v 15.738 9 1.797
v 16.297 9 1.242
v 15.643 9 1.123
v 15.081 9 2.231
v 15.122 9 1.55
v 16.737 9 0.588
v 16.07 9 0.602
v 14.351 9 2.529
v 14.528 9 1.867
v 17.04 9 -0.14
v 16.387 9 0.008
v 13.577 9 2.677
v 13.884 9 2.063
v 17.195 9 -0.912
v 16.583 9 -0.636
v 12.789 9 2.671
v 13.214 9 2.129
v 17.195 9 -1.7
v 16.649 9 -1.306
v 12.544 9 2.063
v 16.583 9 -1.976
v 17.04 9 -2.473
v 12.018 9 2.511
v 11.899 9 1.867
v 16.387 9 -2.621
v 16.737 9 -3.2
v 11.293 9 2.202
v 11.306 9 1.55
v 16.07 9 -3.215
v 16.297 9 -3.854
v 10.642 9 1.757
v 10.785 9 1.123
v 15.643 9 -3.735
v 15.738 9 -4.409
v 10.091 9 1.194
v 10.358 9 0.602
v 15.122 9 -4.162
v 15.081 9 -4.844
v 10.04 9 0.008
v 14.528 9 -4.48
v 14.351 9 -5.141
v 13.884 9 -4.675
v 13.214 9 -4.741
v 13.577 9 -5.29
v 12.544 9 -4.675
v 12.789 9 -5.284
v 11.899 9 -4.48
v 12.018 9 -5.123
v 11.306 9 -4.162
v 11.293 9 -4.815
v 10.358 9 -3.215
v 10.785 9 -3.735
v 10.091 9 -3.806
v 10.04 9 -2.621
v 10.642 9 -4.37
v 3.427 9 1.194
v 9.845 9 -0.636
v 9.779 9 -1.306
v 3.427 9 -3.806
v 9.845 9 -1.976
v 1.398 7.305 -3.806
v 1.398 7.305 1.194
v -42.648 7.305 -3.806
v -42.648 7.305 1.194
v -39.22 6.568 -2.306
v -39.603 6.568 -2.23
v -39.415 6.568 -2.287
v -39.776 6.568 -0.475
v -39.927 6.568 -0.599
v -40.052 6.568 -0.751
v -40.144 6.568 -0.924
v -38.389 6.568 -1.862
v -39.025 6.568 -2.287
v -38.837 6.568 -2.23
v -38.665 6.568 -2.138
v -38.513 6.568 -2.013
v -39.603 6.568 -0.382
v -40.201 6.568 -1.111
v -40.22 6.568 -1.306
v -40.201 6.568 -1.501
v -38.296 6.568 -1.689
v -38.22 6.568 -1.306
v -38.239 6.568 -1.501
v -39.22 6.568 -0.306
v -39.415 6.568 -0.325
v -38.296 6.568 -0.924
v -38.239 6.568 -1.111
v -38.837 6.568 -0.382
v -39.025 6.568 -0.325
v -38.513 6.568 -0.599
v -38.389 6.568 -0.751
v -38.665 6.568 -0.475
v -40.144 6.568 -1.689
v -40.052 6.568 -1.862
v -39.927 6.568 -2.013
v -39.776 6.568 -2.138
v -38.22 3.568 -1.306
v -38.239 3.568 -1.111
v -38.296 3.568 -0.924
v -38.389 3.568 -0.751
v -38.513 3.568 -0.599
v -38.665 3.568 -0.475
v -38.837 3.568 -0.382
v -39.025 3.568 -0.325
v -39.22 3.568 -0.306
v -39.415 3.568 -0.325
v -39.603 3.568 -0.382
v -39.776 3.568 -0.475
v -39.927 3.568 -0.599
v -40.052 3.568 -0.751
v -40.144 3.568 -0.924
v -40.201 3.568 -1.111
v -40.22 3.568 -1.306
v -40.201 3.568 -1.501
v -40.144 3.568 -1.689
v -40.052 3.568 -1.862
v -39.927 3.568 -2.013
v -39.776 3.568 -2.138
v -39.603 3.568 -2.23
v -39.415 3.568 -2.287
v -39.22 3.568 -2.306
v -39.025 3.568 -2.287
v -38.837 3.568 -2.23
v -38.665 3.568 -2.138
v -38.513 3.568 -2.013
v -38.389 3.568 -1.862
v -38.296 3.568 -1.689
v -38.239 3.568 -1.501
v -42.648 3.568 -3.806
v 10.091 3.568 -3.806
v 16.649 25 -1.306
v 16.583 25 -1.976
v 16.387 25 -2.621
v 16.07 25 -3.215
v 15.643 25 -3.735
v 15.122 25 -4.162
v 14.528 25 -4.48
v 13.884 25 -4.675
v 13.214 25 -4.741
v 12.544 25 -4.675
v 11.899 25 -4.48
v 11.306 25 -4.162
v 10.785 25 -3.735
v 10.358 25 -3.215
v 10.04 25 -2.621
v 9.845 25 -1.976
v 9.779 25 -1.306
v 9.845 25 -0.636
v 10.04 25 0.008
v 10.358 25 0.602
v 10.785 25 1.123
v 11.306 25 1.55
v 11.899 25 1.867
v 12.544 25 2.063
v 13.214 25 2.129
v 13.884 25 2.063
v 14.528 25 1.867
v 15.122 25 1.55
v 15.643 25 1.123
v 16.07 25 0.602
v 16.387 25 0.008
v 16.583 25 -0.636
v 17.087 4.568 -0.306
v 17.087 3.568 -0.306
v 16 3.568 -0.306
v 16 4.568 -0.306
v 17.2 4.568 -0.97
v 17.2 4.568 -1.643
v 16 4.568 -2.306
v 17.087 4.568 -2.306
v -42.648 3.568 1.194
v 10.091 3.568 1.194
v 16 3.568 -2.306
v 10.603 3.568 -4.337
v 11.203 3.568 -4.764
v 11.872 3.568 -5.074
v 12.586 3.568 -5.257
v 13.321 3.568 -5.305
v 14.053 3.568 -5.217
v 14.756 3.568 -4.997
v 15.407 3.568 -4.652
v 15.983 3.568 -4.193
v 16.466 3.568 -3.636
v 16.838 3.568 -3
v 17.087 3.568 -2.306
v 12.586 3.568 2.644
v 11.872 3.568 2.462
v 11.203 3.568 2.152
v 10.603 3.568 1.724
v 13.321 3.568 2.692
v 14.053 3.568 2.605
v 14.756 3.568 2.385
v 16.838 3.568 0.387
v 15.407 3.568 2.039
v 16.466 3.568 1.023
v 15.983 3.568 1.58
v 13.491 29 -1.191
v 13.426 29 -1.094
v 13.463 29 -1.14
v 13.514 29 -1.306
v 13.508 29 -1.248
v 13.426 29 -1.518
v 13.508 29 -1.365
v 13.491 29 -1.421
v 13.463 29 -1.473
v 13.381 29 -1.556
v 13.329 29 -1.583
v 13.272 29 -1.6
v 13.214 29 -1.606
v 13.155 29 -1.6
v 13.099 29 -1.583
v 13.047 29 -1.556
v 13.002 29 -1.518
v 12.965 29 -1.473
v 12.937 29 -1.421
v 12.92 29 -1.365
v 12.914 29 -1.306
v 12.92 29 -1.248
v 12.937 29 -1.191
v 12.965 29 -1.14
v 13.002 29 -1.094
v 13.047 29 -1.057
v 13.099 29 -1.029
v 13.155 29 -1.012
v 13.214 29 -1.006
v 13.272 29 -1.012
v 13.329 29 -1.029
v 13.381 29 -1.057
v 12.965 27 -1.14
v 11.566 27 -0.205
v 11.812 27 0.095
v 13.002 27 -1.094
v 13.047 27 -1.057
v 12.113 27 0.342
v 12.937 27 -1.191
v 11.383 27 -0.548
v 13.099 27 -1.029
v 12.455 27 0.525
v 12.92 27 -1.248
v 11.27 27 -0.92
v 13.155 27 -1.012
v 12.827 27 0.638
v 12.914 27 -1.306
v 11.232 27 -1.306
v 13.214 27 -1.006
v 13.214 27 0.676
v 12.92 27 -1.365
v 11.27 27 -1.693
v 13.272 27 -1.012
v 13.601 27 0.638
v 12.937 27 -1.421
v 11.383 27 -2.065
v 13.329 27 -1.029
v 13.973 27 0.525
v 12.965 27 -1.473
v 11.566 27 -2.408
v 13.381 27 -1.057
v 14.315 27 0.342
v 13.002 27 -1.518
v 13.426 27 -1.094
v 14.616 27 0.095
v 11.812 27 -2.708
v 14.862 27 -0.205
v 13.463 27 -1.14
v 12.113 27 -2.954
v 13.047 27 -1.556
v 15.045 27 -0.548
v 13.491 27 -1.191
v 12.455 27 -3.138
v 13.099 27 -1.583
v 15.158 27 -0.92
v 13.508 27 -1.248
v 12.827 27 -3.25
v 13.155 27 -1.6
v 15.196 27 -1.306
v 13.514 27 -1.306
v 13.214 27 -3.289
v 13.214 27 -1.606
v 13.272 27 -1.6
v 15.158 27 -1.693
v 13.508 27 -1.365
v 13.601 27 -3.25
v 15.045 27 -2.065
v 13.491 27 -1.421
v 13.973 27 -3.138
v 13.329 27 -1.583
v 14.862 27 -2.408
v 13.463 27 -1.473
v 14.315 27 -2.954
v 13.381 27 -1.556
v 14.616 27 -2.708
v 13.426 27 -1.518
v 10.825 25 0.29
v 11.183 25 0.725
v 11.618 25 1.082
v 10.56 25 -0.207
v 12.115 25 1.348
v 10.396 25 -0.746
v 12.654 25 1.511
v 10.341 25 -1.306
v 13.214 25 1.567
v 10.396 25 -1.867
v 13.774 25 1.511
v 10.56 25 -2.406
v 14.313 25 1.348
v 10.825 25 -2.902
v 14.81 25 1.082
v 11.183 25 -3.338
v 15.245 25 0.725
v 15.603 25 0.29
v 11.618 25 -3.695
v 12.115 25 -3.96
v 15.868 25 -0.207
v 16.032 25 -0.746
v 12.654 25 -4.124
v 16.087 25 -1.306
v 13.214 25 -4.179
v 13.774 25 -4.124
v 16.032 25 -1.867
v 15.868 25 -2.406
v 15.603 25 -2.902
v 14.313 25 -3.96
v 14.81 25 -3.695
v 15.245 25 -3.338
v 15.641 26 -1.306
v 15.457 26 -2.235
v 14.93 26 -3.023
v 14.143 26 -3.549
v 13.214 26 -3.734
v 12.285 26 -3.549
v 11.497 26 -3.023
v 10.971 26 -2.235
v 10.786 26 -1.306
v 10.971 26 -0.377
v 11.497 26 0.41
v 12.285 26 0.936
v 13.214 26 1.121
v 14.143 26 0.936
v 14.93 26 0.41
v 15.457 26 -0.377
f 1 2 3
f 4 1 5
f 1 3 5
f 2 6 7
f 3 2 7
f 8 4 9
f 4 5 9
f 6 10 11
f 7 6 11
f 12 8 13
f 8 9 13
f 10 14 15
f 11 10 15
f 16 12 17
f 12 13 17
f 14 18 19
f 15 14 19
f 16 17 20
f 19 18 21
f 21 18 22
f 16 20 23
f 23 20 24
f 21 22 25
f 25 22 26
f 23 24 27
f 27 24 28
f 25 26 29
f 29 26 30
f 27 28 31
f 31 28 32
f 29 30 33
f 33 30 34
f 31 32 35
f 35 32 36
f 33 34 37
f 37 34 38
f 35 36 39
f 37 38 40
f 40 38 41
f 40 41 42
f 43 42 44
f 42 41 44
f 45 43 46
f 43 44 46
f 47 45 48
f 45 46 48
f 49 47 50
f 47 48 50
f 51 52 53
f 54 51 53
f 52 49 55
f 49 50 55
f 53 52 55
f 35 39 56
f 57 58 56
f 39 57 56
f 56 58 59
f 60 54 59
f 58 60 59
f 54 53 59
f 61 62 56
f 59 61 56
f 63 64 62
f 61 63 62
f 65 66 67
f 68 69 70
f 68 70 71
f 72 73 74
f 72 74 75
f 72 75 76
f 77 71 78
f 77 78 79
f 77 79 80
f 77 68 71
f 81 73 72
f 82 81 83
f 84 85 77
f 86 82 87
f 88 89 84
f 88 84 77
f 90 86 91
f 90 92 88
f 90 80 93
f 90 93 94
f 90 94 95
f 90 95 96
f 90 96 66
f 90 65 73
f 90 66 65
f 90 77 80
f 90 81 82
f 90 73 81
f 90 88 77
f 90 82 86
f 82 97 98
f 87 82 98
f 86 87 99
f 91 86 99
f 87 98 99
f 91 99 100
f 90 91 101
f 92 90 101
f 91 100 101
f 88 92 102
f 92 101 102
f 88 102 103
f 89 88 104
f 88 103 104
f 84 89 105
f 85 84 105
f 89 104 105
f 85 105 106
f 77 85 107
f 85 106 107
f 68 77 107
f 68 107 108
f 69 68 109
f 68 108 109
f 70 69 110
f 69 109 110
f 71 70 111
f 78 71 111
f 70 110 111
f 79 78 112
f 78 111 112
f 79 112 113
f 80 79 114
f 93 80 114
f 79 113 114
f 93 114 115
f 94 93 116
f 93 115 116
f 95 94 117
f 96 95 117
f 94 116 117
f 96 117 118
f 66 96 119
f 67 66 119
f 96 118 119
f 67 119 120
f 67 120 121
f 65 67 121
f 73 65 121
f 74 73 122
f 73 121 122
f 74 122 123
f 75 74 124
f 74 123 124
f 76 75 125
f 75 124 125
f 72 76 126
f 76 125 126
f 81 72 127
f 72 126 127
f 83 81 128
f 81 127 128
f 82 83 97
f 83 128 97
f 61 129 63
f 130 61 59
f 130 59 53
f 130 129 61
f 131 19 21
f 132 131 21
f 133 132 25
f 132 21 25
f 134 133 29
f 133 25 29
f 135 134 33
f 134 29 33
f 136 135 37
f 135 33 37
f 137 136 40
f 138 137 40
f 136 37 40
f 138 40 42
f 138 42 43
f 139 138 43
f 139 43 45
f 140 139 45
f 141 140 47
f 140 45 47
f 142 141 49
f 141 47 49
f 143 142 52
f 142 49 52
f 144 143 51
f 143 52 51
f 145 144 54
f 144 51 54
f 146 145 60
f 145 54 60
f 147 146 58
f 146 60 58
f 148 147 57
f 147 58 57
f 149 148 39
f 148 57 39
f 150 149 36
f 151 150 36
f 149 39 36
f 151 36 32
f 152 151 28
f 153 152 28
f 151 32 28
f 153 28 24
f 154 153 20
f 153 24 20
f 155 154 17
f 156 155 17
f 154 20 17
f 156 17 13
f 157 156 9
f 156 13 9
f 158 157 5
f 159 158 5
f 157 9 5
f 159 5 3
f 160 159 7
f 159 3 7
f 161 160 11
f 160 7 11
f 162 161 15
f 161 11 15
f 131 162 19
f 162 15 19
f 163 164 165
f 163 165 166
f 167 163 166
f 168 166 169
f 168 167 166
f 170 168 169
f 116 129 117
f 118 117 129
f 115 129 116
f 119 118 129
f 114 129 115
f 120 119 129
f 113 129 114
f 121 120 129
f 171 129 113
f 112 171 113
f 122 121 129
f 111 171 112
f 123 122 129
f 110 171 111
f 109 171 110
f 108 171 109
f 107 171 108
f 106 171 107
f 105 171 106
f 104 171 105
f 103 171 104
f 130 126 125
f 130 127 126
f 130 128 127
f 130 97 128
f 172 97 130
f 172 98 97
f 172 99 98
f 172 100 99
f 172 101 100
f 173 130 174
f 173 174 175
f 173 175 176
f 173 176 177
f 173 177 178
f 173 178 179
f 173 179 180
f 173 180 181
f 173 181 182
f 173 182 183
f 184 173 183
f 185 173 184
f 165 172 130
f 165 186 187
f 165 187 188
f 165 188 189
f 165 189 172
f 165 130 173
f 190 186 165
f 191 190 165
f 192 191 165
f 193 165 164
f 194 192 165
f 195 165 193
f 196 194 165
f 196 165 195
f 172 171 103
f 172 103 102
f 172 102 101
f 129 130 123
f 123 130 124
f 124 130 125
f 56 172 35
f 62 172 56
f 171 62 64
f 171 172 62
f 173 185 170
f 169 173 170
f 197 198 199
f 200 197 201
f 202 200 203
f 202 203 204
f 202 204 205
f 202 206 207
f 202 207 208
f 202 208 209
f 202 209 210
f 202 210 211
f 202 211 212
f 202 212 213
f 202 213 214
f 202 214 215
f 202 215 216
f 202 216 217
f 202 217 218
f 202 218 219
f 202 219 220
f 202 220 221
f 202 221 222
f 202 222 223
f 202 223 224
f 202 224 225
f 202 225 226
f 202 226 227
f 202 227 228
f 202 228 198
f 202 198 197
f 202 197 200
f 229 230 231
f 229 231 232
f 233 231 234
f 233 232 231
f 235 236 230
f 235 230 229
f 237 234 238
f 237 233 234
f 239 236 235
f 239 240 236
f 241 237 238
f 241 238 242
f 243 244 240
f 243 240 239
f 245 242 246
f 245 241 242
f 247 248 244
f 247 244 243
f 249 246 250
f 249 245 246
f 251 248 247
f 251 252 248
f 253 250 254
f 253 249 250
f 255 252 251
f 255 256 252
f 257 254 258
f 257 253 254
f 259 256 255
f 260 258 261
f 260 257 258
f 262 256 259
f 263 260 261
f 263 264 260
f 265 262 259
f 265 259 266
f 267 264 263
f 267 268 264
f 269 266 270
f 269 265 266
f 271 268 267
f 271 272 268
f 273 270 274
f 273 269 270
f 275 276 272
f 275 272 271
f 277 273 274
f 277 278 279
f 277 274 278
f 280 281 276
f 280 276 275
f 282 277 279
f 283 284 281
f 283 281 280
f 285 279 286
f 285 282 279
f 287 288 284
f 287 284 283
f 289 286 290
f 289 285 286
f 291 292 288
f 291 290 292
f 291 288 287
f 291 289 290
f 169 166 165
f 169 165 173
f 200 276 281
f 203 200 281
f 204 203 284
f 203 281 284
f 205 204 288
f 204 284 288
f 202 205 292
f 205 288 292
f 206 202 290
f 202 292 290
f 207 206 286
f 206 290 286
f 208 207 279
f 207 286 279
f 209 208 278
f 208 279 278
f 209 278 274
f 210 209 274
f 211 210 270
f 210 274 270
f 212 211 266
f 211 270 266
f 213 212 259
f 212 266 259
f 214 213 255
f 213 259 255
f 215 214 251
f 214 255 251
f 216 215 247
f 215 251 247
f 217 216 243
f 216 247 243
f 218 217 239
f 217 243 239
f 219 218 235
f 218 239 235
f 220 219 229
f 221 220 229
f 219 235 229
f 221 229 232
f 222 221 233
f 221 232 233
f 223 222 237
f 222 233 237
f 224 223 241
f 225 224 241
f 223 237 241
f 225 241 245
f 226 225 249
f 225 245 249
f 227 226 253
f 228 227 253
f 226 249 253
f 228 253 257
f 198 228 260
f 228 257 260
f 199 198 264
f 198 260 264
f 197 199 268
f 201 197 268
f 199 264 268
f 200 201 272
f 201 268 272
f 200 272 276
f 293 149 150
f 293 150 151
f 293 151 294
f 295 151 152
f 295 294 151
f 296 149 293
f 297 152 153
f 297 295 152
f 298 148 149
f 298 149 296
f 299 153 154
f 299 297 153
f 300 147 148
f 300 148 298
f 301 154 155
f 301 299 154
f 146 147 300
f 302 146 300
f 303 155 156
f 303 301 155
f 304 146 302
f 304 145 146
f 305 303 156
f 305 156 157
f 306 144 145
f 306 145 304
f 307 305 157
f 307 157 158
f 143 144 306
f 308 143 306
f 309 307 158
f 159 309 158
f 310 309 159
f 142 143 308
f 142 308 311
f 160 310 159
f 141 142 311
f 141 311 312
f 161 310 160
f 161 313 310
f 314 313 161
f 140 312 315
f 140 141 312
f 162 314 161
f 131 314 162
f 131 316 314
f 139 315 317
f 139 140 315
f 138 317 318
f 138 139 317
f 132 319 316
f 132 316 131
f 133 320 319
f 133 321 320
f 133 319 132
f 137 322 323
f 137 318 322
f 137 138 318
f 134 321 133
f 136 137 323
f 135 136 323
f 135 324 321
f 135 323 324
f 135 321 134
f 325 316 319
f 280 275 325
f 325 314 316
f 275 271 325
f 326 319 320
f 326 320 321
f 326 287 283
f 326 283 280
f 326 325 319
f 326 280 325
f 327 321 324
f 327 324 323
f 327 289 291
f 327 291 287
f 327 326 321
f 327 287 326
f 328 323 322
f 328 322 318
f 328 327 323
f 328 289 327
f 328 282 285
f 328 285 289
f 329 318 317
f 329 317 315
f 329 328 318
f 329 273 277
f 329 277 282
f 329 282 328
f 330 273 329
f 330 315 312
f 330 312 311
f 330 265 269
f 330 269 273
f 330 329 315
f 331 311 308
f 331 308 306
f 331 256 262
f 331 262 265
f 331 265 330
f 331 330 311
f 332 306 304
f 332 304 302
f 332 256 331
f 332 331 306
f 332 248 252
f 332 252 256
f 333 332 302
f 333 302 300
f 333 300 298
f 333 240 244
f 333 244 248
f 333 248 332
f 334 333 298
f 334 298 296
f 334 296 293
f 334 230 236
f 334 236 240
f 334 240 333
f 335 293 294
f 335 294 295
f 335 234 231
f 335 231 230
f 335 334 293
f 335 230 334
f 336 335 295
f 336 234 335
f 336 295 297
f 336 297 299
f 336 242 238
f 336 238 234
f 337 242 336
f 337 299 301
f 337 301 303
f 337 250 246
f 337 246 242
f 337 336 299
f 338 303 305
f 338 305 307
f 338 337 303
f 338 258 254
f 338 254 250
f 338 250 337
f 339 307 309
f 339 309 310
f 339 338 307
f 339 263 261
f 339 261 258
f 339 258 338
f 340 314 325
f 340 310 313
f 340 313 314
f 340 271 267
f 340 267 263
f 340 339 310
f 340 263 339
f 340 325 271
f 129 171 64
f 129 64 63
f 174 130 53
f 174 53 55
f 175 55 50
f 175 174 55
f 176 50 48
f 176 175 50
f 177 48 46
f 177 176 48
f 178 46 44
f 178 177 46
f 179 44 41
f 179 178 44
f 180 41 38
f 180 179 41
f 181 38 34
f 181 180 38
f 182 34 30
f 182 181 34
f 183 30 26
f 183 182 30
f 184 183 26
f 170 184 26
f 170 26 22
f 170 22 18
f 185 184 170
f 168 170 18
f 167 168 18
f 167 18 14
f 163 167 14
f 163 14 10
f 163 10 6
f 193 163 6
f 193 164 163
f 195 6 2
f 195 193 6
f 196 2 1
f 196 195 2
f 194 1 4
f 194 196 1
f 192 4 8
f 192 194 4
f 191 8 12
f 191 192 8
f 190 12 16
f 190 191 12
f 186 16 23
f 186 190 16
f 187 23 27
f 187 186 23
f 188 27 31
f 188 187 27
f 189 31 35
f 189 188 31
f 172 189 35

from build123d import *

# Parameters (mm, degrees)
BOSS_EXTRUDE1_DEPTH     = 9
CUT_EXTRUDE1_DEPTH      = 6
SKETCH3_R               = 3.434986687
BOSS_EXTRUDE2_DEPTH     = 16
SKETCH4_R               = 2.872742527
BOSS_EXTRUDE3_DEPTH     = 2
BOSS_EXTRUDE3_TAPER     = 24
SKETCH5_R               = 0.3
BOSS_EXTRUDE4_DEPTH     = 2
SKETCH6_W               = 59.861841092
SKETCH6_H               = 3.567823601
CUT_EXTRUDE2_DEPTH      = 2.5
CUT_EXTRUDE2_DEPTH_BACK = 7.5
SKETCH7_R               = 1
CUT_EXTRUDE3_DEPTH      = 3
SKETCH8_W               = 2
SKETCH8_H               = 1
CUT_EXTRUDE4_DEPTH      = 10.0001


with BuildPart() as part:
    # Sketch1 → Boss-Extrude1 (new body)
    with BuildSketch(Plane(origin=(0, 0, 0), x_dir=(1, 0, 0), z_dir=(0, 1, 0))):
        with BuildLine():
            Line((-42.647872244, 3.806239173), (10.091469849, 3.806239173))
            ThreePointArc((10.091469849, 3.806239173), (17.213968848, 1.306239173), (10.091469849, -1.193760827))
            Line((10.091469849, -1.193760827), (-42.647872244, -1.193760827))
            Line((-42.647872244, -1.193760827), (-42.647872244, 3.806239173))
        make_face()
    extrude(amount=BOSS_EXTRUDE1_DEPTH)

    # Sketch2 → Cut-Extrude1 (cut)
    with BuildSketch(Plane.XY.offset(1.193760827)):
        Polygon((1.39800972, 7.304936762), (3.426580057, 9), (1.39800972, 9), (-42.647872244, 9), (-42.647872244, 7.304936762), align=None)
    extrude(amount=-CUT_EXTRUDE1_DEPTH, mode=Mode.SUBTRACT)

    # Sketch3 → Boss-Extrude2 (add)
    with BuildSketch(Plane(origin=(0, 9, 0), x_dir=(1, 0, 0), z_dir=(0, 1, 0))):
        with Locations((13.213968848, 1.306239173)):
            Circle(SKETCH3_R)
    extrude(amount=BOSS_EXTRUDE2_DEPTH)

    # Sketch4 → Boss-Extrude3 (add)
    with BuildSketch(Plane(origin=(0, 25, 0), x_dir=(1, 0, 0), z_dir=(0, 1, 0))):
        with Locations((13.213968848, 1.306239173)):
            Circle(SKETCH4_R)
    extrude(amount=BOSS_EXTRUDE3_DEPTH, taper=BOSS_EXTRUDE3_TAPER)

    # Sketch5 → Boss-Extrude4 (add)
    with BuildSketch(Plane(origin=(0, 27, 0), x_dir=(1, 0, 0), z_dir=(0, 1, 0))):
        with Locations((13.213968848, 1.306239173)):
            Circle(SKETCH5_R)
    extrude(amount=BOSS_EXTRUDE4_DEPTH)

    # Sketch6 → Cut-Extrude2 (cut, two sides)
    with BuildSketch(Plane.XY.offset(1.193760827)) as cut_extrude2_sk:
        with Locations((-12.716951698, 1.783911801)):
            Rectangle(SKETCH6_W, SKETCH6_H)
    extrude(amount=CUT_EXTRUDE2_DEPTH, mode=Mode.SUBTRACT)
    extrude(cut_extrude2_sk.sketch, amount=-CUT_EXTRUDE2_DEPTH_BACK, mode=Mode.SUBTRACT)

    # Sketch7 → Cut-Extrude3 (cut)
    with BuildSketch(Plane.XZ.offset(-3.567823601)):
        with Locations((-39.22011329, -1.306239173)):
            Circle(SKETCH7_R)
    extrude(amount=-CUT_EXTRUDE3_DEPTH, mode=Mode.SUBTRACT)

    # Sketch8 → Cut-Extrude4 (cut)
    with BuildSketch(Plane(origin=(26, 0, 0), x_dir=(0, 0, -1), z_dir=(1, 0, 0))):
        with Locations((1.306239173, 4.067823601)):
            Rectangle(SKETCH8_W, SKETCH8_H)
    extrude(amount=-CUT_EXTRUDE4_DEPTH, mode=Mode.SUBTRACT)


solid = part.part
